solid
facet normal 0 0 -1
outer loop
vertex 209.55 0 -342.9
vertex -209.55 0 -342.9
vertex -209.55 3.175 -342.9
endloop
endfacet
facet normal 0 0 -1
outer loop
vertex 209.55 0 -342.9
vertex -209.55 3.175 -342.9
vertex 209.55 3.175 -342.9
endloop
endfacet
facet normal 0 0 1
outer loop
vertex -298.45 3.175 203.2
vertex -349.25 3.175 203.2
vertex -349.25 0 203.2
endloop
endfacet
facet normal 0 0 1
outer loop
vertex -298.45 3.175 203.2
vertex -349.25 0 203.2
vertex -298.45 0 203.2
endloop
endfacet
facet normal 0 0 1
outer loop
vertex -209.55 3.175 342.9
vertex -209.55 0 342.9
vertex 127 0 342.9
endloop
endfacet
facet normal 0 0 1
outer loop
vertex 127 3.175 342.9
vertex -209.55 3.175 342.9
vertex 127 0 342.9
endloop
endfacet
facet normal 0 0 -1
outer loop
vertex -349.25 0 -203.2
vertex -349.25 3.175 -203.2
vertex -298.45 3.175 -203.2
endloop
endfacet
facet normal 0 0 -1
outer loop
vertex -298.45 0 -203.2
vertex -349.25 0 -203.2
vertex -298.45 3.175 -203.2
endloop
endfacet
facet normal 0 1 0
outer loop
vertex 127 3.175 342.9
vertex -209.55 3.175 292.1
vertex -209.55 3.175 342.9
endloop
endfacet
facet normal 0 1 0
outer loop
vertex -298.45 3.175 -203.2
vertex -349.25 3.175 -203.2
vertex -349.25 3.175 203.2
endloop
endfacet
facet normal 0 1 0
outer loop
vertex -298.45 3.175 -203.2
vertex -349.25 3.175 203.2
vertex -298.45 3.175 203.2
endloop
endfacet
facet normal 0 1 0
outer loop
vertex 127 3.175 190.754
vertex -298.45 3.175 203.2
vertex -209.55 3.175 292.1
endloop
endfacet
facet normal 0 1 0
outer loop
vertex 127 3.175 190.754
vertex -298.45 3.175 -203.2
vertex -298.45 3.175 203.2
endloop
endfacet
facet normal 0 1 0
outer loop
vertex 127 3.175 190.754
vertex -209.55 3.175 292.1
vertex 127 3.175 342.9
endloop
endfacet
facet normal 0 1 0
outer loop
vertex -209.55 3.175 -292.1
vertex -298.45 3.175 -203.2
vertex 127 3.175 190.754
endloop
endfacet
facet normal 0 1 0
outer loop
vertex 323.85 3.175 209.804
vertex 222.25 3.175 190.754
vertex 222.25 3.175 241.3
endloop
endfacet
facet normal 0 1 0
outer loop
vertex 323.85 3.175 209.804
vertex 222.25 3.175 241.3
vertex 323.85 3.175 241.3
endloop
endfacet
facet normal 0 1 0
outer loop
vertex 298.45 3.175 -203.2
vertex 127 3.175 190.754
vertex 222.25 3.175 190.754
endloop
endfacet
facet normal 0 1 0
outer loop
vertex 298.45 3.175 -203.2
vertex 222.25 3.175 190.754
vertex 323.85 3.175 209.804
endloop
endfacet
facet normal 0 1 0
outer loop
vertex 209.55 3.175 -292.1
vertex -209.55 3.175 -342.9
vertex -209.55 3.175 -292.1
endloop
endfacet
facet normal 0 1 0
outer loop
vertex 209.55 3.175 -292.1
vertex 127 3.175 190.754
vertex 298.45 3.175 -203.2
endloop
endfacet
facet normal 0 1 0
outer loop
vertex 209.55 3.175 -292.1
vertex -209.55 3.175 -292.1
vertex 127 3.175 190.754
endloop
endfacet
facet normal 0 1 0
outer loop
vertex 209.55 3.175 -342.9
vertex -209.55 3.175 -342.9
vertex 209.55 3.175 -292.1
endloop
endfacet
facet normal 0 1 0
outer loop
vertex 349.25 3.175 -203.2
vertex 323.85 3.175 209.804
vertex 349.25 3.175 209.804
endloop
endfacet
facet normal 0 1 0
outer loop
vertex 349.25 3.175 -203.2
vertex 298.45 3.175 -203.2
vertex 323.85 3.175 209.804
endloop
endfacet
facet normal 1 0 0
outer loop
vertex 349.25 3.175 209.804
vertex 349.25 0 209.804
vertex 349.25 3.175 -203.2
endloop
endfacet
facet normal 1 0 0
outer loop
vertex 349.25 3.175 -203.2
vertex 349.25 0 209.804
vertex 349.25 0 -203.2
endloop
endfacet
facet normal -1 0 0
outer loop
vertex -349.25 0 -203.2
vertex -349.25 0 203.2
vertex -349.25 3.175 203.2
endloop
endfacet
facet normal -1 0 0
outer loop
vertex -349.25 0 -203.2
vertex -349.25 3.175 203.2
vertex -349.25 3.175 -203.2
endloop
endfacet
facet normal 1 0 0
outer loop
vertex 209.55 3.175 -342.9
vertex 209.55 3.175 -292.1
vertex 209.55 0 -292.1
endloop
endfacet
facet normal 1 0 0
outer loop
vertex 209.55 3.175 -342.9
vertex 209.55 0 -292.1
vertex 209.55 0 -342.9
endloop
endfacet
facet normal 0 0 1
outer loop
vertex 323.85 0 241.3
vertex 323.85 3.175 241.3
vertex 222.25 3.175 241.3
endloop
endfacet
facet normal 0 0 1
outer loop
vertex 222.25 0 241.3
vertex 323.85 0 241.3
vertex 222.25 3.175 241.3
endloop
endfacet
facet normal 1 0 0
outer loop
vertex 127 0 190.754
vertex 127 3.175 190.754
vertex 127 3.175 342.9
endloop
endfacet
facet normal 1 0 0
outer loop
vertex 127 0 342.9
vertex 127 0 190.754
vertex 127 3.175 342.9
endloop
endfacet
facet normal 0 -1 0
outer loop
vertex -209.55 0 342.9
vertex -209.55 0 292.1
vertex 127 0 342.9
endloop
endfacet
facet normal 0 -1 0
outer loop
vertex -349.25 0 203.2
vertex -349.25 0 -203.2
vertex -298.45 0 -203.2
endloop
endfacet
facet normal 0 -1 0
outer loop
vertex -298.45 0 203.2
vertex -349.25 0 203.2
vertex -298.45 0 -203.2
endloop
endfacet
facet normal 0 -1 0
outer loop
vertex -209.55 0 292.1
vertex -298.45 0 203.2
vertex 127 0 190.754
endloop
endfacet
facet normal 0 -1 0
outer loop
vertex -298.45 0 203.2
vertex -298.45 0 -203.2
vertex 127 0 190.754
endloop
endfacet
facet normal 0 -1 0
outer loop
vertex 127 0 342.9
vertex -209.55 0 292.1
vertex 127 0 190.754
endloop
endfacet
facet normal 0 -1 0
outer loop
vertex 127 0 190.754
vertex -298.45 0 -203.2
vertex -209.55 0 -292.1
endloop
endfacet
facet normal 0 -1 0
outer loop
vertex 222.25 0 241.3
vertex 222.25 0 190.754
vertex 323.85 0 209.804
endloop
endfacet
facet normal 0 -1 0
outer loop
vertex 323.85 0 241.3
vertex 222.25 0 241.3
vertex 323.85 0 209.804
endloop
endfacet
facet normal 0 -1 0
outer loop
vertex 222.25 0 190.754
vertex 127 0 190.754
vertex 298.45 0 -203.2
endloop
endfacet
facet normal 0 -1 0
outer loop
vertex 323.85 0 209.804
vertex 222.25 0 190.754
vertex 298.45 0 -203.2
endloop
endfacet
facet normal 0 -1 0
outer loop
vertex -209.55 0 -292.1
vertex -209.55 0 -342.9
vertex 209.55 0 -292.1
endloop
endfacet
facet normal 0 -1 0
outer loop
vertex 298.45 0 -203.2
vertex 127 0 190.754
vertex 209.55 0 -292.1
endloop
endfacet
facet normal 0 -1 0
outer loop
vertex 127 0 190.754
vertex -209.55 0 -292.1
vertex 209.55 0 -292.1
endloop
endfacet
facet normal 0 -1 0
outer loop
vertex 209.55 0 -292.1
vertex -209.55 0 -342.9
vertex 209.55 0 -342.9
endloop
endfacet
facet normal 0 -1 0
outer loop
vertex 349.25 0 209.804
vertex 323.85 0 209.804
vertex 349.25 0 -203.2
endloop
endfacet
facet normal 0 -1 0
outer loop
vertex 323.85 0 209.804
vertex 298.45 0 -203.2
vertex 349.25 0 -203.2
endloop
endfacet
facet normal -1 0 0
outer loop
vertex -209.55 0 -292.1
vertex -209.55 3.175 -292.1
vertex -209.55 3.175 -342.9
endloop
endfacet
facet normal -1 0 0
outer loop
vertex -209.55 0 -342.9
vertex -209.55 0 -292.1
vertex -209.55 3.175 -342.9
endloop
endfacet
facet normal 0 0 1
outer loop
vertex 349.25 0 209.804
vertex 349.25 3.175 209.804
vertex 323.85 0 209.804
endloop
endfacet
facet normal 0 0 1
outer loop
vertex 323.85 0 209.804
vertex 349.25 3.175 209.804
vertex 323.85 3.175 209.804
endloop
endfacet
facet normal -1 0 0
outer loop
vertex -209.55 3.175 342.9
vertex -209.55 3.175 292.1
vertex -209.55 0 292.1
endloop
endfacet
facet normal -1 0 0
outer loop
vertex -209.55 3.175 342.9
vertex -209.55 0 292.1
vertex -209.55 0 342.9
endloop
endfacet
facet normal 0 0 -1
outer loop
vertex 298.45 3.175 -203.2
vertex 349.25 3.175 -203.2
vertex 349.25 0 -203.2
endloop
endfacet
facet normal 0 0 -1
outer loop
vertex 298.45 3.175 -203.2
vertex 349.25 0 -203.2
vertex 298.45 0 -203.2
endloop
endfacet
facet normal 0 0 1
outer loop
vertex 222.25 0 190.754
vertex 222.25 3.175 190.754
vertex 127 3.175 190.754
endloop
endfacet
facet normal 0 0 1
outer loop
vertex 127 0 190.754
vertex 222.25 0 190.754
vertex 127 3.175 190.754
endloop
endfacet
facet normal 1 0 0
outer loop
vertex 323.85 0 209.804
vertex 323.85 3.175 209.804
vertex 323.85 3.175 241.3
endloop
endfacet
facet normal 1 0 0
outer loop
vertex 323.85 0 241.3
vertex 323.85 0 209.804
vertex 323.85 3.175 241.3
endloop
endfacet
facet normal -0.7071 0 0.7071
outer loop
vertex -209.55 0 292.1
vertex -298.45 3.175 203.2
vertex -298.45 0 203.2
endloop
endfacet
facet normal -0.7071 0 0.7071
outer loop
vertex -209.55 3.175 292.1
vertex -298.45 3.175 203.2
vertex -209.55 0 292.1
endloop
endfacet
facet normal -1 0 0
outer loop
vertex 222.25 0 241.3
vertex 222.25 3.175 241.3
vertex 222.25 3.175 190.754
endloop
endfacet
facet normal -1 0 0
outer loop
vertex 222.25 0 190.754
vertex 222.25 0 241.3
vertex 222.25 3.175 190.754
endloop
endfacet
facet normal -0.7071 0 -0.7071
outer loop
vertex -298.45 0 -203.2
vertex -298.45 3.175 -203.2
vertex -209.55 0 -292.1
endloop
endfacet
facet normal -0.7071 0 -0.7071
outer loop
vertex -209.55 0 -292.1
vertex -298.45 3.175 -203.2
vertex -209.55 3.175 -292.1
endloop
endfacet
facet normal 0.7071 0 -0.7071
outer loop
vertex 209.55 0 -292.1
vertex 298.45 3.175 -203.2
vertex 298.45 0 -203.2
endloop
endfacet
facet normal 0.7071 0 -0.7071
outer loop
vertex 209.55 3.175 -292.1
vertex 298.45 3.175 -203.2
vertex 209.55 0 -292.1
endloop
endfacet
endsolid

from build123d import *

# Parameters (mm, degrees)
SKETCH1_W           = 698.5
SKETCH1_H           = 685.8
BOSS_EXTRUDE1_DEPTH = 3.175
CUT_EXTRUDE1_DEPTH  = 4.175
CUT_EXTRUDE2_DEPTH  = 4.175


with BuildPart() as part:
    # Sketch1 → Boss-Extrude1 (new body)
    with BuildSketch(Plane(origin=(0, 0, 0), x_dir=(1, 0, 0), z_dir=(0, 1, 0))):
        Rectangle(SKETCH1_W, SKETCH1_H)
    extrude(amount=BOSS_EXTRUDE1_DEPTH)

    # Sketch3 → Cut-Extrude1 (cut, through all)
    with BuildSketch(Plane(origin=(0, 3.175, 0), x_dir=(1, 0, 0), z_dir=(0, 1, 0))):
        Polygon((-298.45, 203.2), (-209.55, 292.1), (-209.55, 342.9), (-349.25, 342.9), (-349.25, 203.2), align=None)
        Polygon((-349.25, -203.2), (-298.45, -203.2), (-209.55, -292.1), (-209.55, -342.9), (-349.25, -342.9), align=None)
        Polygon((349.25, 203.2), (298.45, 203.2), (209.55, 292.1), (209.55, 342.9), (349.25, 342.9), align=None)
    extrude(amount=-CUT_EXTRUDE1_DEPTH, mode=Mode.SUBTRACT)

    # Sketch7 → Cut-Extrude2 (cut, through all)
    with BuildSketch(Plane(origin=(-6.096, 3.175, 0.254), x_dir=(1, 0, 0), z_dir=(0, 1, 0))):
        Polygon((133.096, -190.5), (133.096, -355.346), (368.046, -355.346), (368.046, -209.55), (329.946, -209.55), (329.946, -241.046), (228.346, -241.046), (228.346, -190.5), align=None)
    extrude(amount=-CUT_EXTRUDE2_DEPTH, mode=Mode.SUBTRACT)


solid = part.part
